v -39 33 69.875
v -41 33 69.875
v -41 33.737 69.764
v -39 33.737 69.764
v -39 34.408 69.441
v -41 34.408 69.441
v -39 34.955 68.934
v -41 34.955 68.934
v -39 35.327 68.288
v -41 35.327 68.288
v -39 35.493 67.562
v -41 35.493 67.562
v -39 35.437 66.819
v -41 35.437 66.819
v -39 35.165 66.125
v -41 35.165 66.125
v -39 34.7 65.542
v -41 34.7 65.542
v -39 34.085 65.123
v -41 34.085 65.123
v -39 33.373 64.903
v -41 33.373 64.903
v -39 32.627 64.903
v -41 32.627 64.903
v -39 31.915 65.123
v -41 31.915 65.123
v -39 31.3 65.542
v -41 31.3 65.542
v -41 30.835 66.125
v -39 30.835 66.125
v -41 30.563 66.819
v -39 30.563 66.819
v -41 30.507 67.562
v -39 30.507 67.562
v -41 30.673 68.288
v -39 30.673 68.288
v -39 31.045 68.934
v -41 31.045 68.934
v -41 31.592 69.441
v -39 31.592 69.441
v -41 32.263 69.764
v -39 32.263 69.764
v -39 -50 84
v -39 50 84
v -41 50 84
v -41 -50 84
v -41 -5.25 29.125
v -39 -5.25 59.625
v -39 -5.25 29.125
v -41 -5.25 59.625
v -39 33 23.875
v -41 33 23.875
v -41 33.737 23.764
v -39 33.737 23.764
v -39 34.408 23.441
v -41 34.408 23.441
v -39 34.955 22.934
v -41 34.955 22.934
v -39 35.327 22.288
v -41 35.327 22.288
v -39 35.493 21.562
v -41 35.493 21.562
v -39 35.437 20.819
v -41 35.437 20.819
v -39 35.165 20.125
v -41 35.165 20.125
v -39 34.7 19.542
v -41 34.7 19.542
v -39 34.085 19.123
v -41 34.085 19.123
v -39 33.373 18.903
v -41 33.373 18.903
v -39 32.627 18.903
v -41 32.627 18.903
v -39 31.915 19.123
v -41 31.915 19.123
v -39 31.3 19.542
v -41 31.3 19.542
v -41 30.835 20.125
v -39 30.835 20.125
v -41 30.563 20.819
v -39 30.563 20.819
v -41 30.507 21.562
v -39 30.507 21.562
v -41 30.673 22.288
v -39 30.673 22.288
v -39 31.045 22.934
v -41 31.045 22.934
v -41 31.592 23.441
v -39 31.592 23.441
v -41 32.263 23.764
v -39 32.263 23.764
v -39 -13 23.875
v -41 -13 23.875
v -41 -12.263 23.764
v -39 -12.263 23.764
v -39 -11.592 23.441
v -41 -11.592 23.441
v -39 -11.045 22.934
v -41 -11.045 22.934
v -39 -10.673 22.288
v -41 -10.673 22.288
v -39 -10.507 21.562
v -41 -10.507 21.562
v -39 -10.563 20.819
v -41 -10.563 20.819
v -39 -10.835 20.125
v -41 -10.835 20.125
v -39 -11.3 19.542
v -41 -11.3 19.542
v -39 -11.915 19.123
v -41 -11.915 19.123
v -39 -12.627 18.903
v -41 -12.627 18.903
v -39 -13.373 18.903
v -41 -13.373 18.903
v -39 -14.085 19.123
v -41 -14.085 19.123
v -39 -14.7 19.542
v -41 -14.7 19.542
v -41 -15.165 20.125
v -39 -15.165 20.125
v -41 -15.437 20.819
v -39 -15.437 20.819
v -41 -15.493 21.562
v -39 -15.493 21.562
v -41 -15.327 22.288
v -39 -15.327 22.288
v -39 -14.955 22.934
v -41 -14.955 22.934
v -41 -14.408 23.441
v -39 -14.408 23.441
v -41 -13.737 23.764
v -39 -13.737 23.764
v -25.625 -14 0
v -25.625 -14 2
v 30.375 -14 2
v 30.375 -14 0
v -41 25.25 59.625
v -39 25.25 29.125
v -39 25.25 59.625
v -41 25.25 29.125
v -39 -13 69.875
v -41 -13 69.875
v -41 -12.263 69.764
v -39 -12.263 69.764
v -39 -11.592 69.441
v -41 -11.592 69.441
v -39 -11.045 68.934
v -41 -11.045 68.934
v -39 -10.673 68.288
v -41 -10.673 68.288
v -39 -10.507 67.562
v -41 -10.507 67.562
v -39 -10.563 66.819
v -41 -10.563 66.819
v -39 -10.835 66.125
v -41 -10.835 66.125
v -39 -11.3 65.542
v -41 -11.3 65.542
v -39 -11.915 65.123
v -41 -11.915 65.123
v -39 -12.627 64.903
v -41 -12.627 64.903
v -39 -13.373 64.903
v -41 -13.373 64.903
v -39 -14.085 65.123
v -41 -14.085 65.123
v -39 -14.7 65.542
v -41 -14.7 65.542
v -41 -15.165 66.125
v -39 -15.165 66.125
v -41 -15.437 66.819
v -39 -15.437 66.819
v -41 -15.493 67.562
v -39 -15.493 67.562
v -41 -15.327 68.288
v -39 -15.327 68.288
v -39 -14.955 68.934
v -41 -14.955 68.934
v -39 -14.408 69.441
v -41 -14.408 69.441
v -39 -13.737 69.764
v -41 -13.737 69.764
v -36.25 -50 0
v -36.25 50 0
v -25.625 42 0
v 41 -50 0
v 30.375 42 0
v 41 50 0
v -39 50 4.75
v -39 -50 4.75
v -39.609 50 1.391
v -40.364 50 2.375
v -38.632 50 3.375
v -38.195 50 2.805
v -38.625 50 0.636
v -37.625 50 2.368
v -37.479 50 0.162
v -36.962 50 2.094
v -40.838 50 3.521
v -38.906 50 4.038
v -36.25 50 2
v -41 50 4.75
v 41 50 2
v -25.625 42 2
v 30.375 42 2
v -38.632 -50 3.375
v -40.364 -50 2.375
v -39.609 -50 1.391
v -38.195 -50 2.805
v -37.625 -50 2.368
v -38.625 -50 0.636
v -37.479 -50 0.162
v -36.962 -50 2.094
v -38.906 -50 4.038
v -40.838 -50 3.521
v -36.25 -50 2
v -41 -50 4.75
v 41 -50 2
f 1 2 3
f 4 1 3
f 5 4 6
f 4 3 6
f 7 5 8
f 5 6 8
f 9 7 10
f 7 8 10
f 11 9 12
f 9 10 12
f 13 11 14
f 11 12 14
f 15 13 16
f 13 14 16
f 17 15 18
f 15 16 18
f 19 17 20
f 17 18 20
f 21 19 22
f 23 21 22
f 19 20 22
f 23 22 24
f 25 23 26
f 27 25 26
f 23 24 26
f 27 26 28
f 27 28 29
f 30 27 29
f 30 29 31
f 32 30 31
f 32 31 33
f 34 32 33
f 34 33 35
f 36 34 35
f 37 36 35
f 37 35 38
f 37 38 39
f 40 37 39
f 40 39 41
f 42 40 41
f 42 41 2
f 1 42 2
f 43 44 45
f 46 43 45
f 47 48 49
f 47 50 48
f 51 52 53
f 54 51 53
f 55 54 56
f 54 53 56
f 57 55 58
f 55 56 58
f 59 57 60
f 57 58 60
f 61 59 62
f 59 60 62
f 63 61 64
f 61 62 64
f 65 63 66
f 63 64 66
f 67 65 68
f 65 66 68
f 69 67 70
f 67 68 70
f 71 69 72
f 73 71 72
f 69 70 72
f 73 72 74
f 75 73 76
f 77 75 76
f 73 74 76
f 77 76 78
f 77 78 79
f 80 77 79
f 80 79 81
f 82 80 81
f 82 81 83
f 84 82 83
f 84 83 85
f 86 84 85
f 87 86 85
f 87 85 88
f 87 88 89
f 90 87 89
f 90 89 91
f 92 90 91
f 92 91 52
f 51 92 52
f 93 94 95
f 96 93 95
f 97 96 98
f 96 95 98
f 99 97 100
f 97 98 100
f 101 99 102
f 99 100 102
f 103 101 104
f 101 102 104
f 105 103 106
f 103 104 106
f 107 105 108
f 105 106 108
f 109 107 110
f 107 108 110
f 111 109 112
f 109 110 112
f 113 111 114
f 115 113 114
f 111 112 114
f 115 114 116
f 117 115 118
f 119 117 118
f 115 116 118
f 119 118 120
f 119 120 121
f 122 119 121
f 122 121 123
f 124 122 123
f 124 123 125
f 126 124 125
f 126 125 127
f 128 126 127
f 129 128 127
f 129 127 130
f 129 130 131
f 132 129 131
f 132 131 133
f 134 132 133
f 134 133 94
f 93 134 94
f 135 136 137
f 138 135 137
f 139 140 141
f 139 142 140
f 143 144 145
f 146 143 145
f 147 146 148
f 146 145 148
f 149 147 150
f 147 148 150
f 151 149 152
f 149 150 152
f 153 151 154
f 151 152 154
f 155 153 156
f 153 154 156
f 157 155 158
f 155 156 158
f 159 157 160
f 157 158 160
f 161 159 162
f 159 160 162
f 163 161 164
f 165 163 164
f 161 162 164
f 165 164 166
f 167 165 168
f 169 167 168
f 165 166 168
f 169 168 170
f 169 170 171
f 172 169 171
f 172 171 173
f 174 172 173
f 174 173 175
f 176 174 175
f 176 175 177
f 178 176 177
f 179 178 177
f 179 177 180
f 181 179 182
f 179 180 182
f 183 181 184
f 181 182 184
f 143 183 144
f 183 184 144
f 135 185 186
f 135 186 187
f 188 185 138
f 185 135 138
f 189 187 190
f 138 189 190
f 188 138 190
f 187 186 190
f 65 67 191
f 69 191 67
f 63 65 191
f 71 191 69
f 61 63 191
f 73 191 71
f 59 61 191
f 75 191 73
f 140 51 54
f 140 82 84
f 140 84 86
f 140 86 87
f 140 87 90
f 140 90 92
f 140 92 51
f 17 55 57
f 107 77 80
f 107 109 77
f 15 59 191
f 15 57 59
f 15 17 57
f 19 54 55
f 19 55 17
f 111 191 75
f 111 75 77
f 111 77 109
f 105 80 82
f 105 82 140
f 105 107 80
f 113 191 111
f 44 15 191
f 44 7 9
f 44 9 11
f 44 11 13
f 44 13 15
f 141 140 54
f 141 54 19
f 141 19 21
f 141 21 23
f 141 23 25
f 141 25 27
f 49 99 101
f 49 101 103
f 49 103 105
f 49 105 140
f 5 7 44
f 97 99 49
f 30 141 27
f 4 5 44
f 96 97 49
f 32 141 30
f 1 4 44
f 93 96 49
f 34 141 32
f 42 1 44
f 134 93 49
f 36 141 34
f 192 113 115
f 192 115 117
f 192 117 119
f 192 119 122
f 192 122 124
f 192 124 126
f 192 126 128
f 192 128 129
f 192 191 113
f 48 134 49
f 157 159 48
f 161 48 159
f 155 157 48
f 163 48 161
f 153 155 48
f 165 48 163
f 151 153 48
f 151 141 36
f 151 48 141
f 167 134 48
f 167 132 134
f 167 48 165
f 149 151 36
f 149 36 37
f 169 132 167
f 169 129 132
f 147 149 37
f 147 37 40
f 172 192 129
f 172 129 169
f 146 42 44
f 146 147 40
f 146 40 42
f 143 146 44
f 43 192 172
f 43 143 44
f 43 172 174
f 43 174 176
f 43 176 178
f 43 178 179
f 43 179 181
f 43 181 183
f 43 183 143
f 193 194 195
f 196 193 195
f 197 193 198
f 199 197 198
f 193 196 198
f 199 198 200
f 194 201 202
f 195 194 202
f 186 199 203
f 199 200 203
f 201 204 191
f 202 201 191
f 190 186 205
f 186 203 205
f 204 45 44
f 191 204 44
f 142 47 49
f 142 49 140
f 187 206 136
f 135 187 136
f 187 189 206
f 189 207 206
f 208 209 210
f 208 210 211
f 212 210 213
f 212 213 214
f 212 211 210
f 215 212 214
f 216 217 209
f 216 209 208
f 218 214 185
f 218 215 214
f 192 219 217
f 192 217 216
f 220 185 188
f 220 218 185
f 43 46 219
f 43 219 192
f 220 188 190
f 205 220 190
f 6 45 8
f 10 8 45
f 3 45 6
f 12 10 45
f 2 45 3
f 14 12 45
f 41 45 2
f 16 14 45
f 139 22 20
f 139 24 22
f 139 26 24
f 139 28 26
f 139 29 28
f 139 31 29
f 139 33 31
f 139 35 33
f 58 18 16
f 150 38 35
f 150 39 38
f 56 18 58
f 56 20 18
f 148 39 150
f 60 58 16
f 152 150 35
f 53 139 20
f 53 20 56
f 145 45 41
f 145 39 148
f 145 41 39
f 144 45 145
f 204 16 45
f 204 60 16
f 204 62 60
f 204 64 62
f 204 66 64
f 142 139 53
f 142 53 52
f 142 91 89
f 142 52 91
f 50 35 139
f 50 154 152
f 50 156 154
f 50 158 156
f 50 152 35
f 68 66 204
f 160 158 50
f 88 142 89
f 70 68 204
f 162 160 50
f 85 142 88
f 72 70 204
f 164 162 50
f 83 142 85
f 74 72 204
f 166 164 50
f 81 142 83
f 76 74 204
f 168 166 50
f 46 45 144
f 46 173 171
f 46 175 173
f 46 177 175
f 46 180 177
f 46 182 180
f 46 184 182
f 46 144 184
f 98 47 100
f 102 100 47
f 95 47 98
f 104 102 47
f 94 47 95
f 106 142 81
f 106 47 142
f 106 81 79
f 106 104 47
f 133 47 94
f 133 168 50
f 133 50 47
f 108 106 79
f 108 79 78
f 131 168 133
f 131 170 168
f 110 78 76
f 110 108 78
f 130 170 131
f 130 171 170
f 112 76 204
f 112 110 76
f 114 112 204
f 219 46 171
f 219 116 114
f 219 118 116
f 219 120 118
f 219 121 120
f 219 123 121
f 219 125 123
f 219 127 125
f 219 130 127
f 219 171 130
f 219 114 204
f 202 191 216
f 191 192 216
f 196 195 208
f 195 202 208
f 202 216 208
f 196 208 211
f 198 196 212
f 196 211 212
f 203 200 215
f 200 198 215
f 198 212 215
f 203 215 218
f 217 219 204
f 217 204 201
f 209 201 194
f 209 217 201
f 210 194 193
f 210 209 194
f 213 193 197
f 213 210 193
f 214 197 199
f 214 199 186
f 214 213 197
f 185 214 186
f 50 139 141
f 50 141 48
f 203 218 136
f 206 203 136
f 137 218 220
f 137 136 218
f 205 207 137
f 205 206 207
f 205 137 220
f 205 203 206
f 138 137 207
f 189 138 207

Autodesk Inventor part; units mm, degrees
ref_plane "YZ Plane" through (0, 0, 0) normal (1, 0, 0) x (0, 1, 0)
ref_plane "XZ Plane" through (0, 0, 0) normal (0, 1, 0) x (-1, 0, 0)
ref_plane "XY Plane" through (0, 0, 0) normal (0, 0, 1) x (1, 0, 0)
sketch "Sketch1" plane through (0, 0, 0) normal (0, 0, 1) x (1, 0, 0)
  line L0 (-41, -50) -> (41, -50)
  line L1 (41, -50) -> (41, 50)
  line L2 (41, 50) -> (-41, 50)
  line L3 (-41, 50) -> (-41, -50)
  line L4 (-41, -50) -> (41, 50) construction
  line L5 (41, -50) -> (-41, 50) construction
  point P0 (0, 0)
  dimension "d154" = 82
  dimension "d155" = 100
extrude "Plate5" add sketch "Sketch1" along normal blind 2
sketch "Sketch7" plane through (-39, -50, 0) normal (-1, 0, 0) x (0, -1, 0)
  line L0 (-100, 0) -> (0, 0)
  line L1 (0, 0) -> (0, 84)
  line L2 (0, 84) -> (-100, 84)
  line L3 (-100, 84) -> (-100, 0)
edge flange "Flange3" height 84 angle 90 thickness 2 bend radius 2.75 thickness toward (-1, 0, 0) relief round relief width 2 relief depth 1 edges at (-41, 0, 2) wall of the first edge with corners at (-39, 50, 0) (-39, -50, 0) (-39, -50, 84) (-39, 50, 84)
bend "Bend3"
corner "Corner3"
sketch "Sketch8" plane through (0, 0, 2) normal (0, 0, 1) x (1, 0, 0)
  line L0 (41, 50) -> (41, -50) projected
  line L1 (-36.25, 50) -> (41, 50) projected
  line L2 (30.375, 42) -> (-25.625, 42)
  line L3 (-25.625, 42) -> (-25.625, -14)
  line L4 (-25.625, -14) -> (30.375, -14)
  line L5 (30.375, -14) -> (30.375, 42)
  line L6 (30.375, 42) -> (-25.625, -14) construction
  line L7 (-25.625, 42) -> (30.375, -14) construction
  point P0 (0, 0)
  point P1 (2.375, 14)
  point P2 (2.375, 50)
  dimension "d167" = 56
  dimension "d168" = 56
  dimension "d169" = 8
extrude "Cut1" cut sketch "Sketch8" against normal blind 2
sketch "Sketch9" plane through (-41, -50, 84) normal (-1, 0, 0) x (0, 0, 1)
  line L0 (-24.375, 44.75) -> (-54.875, 44.75)
  line L1 (-54.875, 44.75) -> (-54.875, 75.25)
  line L2 (-54.875, 75.25) -> (-24.375, 75.25)
  line L3 (-24.375, 75.25) -> (-24.375, 44.75)
  line L4 (-24.375, 44.75) -> (-54.875, 75.25) construction
  line L5 (-54.875, 44.75) -> (-24.375, 75.25) construction
  circle A0 centre (-16.625, 37) radius 2.5
  circle A1 centre (-62.625, 37) radius 2.5
  circle A2 centre (-62.625, 83) radius 2.5
  circle A3 centre (-16.625, 83) radius 2.5
  circle A4 centre (-39.625, 60) radius 32.5269 construction
  line L6 (-54.875, 44.75) -> (-62.625, 37) construction
  line L7 (-14.125, 34.5) -> (-65.125, 34.5) construction
  line L8 (-65.125, 34.5) -> (-65.125, 85.5) construction
  line L9 (-65.125, 85.5) -> (-14.125, 85.5) construction
  line L10 (-14.125, 85.5) -> (-14.125, 34.5) construction
  line L11 (-14.125, 34.5) -> (-65.125, 85.5) construction
  line L12 (-65.125, 34.5) -> (-14.125, 85.5) construction
  line L13 (-79.25, 100) -> (0, 100) projected
  line L14 (-39.625, 100) -> (-39.625, 60) construction
  circle A5 centre (-62.625, 83) radius 10.9602 construction
  line L15 (-16.625, 37) -> (-62.625, 37) construction
  line L16 (-62.625, 37) -> (-62.625, 83) construction
  line L17 (-62.625, 83) -> (-16.625, 83) construction
  line L18 (-16.625, 83) -> (-16.625, 37) construction
  line L19 (-16.625, 37) -> (-62.625, 83) construction
  line L20 (-62.625, 37) -> (-16.625, 83) construction
  point P0 (-84, 50)
  point P1 (-104.8197, 150.8767)
  point P2 (-104.8197, 150.8767)
  dimension "d181" = 21.9203
  dimension "d174" = 30.5
  dimension "d175" = 30.5
  dimension "d176" = 5
  dimension "d179" = 40
  dimension "d180" = 51
  dimension "d184" = 46
extrude "Cut2" cut sketch "Sketch9" against normal blind 2
properties part number "PRS 940-510 FDS Central tube wall" material "Stainless Steel"
